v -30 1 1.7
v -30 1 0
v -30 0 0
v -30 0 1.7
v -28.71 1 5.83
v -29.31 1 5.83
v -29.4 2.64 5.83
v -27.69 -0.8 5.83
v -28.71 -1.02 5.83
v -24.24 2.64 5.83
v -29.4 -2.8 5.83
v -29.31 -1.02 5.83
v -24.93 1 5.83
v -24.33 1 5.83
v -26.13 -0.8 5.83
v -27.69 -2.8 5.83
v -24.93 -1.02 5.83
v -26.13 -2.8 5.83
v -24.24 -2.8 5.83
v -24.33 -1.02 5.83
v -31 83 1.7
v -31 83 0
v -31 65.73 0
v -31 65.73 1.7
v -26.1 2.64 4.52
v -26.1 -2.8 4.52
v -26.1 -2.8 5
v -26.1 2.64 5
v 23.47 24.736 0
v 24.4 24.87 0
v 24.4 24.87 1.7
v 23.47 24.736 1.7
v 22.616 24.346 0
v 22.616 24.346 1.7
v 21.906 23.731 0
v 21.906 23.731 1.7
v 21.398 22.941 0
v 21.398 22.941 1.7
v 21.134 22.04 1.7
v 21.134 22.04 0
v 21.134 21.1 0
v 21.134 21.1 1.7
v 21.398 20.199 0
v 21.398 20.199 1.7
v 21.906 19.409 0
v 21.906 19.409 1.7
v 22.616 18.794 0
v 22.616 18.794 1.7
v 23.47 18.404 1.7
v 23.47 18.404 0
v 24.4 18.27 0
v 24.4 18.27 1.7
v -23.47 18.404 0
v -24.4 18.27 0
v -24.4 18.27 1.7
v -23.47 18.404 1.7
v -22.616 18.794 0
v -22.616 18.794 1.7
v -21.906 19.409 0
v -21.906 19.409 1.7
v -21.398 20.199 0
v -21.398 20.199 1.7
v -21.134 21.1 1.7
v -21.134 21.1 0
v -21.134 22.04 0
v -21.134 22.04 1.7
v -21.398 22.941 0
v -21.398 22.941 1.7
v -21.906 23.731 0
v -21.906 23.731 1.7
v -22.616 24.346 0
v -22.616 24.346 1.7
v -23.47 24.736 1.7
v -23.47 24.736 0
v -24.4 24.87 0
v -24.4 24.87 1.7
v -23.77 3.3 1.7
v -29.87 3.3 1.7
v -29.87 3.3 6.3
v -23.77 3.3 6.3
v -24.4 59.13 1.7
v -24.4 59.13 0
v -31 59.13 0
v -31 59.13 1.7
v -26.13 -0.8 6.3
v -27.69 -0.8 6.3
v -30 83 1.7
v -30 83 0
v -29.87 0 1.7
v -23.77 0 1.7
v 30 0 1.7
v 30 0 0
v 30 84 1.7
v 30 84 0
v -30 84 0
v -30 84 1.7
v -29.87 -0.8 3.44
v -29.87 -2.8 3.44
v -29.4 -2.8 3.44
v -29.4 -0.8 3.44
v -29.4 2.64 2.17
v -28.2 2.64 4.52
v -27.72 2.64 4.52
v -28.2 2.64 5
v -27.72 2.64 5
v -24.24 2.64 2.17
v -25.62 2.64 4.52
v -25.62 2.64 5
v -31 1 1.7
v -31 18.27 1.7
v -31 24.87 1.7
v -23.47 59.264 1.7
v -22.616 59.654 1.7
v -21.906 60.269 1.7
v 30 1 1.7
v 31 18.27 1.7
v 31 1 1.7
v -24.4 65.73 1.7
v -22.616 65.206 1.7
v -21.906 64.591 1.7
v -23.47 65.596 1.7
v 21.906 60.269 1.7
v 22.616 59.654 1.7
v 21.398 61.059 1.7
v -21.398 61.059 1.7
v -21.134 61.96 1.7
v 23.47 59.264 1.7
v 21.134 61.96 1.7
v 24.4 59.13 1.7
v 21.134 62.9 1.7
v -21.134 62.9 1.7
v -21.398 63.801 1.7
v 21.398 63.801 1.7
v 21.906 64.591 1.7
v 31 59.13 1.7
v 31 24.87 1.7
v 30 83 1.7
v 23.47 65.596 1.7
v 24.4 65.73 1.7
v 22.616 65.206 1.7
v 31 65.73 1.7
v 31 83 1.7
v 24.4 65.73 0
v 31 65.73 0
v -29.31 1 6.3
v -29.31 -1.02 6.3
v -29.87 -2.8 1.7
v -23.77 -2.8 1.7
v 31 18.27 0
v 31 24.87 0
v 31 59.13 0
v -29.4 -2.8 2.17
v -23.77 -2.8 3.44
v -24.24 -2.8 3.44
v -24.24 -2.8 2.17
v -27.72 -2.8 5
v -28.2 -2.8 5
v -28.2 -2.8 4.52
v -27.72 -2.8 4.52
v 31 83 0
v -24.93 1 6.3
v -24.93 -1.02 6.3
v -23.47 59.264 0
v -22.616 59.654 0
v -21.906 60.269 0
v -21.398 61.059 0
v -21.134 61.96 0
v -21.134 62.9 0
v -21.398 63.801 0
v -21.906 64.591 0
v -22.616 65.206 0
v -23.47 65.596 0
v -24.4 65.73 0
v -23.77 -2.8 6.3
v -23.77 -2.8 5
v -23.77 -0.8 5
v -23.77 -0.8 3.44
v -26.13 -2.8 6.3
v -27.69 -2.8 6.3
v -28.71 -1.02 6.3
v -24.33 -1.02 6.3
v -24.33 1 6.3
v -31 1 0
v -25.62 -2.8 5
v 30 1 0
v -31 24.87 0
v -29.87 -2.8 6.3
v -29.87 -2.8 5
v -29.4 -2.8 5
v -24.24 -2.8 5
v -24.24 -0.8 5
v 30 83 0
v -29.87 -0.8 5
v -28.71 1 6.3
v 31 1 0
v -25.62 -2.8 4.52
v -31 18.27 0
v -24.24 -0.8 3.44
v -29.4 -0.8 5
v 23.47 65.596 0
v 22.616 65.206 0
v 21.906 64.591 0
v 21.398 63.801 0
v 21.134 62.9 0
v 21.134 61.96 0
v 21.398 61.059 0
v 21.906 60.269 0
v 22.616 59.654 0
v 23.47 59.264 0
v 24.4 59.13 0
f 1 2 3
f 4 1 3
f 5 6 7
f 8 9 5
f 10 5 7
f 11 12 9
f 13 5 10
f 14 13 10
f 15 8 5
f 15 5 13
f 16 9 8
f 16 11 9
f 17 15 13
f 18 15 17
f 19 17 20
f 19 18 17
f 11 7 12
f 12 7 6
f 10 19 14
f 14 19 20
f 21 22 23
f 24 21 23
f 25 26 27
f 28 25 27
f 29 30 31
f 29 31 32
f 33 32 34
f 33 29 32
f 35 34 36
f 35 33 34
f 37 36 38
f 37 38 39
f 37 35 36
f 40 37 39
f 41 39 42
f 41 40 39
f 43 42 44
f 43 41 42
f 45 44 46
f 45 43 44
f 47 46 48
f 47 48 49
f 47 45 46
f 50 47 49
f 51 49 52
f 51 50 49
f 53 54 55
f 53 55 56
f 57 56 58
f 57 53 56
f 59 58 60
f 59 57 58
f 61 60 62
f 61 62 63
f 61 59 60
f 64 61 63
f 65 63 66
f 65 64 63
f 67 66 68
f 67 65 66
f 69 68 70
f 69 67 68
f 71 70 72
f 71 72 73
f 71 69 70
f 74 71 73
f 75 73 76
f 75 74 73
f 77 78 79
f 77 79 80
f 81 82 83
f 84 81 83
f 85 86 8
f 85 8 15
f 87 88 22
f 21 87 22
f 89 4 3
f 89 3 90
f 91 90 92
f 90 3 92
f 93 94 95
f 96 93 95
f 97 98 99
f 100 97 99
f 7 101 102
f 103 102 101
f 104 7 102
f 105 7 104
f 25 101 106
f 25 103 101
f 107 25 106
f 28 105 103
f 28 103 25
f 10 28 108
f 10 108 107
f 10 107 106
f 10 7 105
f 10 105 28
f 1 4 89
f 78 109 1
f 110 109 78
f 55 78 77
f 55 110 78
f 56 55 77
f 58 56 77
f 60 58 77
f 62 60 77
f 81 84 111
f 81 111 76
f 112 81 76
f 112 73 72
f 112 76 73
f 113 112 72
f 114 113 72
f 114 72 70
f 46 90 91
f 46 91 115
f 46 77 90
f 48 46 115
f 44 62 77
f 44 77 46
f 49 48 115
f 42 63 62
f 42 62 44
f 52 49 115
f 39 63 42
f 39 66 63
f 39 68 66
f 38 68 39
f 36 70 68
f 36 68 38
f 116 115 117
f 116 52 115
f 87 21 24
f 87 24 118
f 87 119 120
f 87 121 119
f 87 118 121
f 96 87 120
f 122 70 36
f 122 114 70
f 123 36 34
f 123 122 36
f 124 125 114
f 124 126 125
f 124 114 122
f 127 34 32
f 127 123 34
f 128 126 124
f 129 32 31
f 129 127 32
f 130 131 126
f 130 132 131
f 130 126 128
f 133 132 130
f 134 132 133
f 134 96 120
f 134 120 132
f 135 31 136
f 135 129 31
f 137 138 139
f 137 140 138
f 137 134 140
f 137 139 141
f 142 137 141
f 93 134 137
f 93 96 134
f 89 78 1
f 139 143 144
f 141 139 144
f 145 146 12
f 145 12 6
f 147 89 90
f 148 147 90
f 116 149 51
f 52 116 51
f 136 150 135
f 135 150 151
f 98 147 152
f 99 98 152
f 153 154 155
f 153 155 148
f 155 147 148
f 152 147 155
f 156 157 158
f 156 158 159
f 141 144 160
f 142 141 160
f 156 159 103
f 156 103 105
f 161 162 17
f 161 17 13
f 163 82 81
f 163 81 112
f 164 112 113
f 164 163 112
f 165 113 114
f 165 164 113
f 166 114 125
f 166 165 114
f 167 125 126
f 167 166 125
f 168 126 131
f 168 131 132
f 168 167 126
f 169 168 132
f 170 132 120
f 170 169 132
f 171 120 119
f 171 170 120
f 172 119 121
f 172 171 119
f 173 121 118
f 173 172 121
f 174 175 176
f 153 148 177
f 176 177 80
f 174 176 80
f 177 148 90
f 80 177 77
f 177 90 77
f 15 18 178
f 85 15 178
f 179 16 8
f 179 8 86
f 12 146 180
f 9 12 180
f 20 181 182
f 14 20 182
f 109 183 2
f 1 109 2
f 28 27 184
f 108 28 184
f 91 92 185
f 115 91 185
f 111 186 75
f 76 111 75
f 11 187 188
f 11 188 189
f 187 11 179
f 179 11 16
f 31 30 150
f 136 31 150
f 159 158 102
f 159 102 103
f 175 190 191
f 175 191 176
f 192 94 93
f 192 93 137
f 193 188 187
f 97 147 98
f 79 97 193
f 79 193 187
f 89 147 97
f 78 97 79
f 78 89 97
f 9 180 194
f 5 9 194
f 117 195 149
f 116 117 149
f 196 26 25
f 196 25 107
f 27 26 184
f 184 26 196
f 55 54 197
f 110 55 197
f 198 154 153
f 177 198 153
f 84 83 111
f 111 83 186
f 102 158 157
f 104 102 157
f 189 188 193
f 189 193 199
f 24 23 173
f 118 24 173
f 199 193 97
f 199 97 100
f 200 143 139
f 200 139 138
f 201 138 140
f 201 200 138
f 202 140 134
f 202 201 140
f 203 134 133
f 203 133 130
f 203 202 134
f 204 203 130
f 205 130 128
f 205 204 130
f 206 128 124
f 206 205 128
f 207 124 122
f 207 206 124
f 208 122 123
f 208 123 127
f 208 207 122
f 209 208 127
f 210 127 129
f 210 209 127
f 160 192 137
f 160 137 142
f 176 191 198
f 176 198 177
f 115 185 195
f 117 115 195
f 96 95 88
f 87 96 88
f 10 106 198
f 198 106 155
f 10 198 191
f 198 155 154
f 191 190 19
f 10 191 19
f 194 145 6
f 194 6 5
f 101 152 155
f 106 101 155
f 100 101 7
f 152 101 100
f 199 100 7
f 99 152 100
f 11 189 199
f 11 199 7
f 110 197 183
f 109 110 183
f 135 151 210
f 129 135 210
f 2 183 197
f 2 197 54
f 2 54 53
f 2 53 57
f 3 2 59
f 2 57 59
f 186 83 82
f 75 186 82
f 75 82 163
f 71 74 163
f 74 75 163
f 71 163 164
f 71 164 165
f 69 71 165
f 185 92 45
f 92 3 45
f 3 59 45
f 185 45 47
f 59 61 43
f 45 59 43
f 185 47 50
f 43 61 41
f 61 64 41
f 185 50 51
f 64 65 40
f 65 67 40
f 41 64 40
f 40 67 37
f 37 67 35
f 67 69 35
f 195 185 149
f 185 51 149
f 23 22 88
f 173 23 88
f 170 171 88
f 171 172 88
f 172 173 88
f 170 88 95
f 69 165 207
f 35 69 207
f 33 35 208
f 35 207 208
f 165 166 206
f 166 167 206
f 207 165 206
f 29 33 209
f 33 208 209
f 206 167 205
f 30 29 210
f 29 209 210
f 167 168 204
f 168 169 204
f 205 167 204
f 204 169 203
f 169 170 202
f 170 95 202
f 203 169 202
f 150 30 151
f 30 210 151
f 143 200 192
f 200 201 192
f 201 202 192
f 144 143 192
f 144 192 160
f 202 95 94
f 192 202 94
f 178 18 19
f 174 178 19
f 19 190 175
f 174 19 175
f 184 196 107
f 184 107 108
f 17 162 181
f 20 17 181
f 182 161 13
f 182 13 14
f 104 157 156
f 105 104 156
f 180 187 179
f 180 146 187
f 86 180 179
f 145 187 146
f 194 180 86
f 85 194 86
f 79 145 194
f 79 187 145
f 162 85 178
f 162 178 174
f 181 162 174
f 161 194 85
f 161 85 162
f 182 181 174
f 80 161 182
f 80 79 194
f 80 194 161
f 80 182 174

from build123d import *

# Parameters (mm, degrees)
PAD_DEPTH       = 1.7
SKETCH008_W     = 6.1
SKETCH008_H     = 6.1
PAD003_DEPTH    = 4.6
SKETCH014_W     = 5.16
SKETCH014_H     = 3.66
SKETCH014_W_2   = 0.48
SKETCH014_H_2   = 0.48
POCKET003_DEPTH = 5.44
SKETCH015_W     = 0.47
SKETCH015_H     = 1.56
SKETCH015_W_2   = 1.56
SKETCH015_H_2   = 0.47
POCKET004_DEPTH = 2
SKETCH016_W     = 0.6
SKETCH016_H     = 2.02
POCKET005_DEPTH = 1


with BuildPart() as part:
    # Sketch → Pad (new body)
    with BuildSketch(Plane.XY):
        with BuildLine():
            Line((0, 0), (30, 0))
            Line((30, 0), (30, 1))
            Line((30, 1), (31, 1))
            Line((31, 1), (31, 18.27))
            Line((31, 18.27), (24.4, 18.27))
            ThreePointArc((24.4, 24.87), (21.1, 21.57), (24.4, 18.27))
            Line((24.4, 24.87), (31, 24.87))
            Line((31, 24.87), (31, 59.13))
            Line((31, 59.13), (24.4, 59.13))
            ThreePointArc((24.4, 65.73), (21.1, 62.43), (24.4, 59.13))
            Line((24.4, 65.73), (31, 65.73))
            Line((31, 65.73), (31, 83))
            Line((30, 83), (31, 83))
            Line((30, 84), (30, 83))
            Line((30, 84), (0, 84))
            Line((0, 84), (-30, 84))
            Line((-30, 84), (-30, 83))
            Line((-30, 83), (-31, 83))
            Line((-31, 83), (-31, 65.73))
            Line((-31, 65.73), (-24.4, 65.73))
            ThreePointArc((-24.4, 59.13), (-21.1, 62.43), (-24.4, 65.73))
            Line((-24.4, 59.13), (-31, 59.13))
            Line((-31, 59.13), (-31, 24.87))
            Line((-31, 24.87), (-24.4, 24.87))
            ThreePointArc((-24.4, 18.27), (-21.1, 21.57), (-24.4, 24.87))
            Line((-24.4, 18.27), (-31, 18.27))
            Line((-31, 18.27), (-31, 1))
            Line((-31, 1), (-30, 1))
            Line((-30, 1), (-30, 0))
            Line((-30, 0), (0, 0))
        make_face()
    extrude(amount=PAD_DEPTH)

    # Sketch008 → Pad003 (new body)
    with BuildSketch(Plane.XY.offset(1.7)):
        with Locations((-26.82, 0.25)):
            Rectangle(SKETCH008_W, SKETCH008_H)
    extrude(amount=PAD003_DEPTH)

    # Sketch014 → Pocket003 (cut)
    with BuildSketch(Plane.XZ.offset(2.8)):
        with Locations((-26.82, 4)):
            Rectangle(SKETCH014_W, SKETCH014_H)
        with Locations((-27.96, 4.76)):
            Rectangle(SKETCH014_W_2, SKETCH014_H_2, mode=Mode.SUBTRACT)
        with Locations((-25.86, 4.76)):
            Rectangle(SKETCH014_W_2, SKETCH014_H_2, mode=Mode.SUBTRACT)
    extrude(amount=-POCKET003_DEPTH, mode=Mode.SUBTRACT)

    # Sketch015 → Pocket004 (cut)
    with BuildSketch(Plane.XZ.offset(2.8)):
        with Locations((-29.635, 4.22)):
            Rectangle(SKETCH015_W, SKETCH015_H)
        with Locations((-24.005, 4.22)):
            Rectangle(SKETCH015_W, SKETCH015_H)
        with Locations((-26.91, 6.065)):
            Rectangle(SKETCH015_W_2, SKETCH015_H_2)
    extrude(amount=-POCKET004_DEPTH, mode=Mode.SUBTRACT)

    # Sketch016 → Pocket005 (cut)
    with BuildSketch(Plane.XY.offset(6.3)):
        with Locations((-29.01, -0.01)):
            Rectangle(SKETCH016_W, SKETCH016_H)
        with Locations((-24.63, -0.01)):
            Rectangle(SKETCH016_W, SKETCH016_H)
    extrude(amount=-POCKET005_DEPTH, mode=Mode.SUBTRACT)


solid = part.part
